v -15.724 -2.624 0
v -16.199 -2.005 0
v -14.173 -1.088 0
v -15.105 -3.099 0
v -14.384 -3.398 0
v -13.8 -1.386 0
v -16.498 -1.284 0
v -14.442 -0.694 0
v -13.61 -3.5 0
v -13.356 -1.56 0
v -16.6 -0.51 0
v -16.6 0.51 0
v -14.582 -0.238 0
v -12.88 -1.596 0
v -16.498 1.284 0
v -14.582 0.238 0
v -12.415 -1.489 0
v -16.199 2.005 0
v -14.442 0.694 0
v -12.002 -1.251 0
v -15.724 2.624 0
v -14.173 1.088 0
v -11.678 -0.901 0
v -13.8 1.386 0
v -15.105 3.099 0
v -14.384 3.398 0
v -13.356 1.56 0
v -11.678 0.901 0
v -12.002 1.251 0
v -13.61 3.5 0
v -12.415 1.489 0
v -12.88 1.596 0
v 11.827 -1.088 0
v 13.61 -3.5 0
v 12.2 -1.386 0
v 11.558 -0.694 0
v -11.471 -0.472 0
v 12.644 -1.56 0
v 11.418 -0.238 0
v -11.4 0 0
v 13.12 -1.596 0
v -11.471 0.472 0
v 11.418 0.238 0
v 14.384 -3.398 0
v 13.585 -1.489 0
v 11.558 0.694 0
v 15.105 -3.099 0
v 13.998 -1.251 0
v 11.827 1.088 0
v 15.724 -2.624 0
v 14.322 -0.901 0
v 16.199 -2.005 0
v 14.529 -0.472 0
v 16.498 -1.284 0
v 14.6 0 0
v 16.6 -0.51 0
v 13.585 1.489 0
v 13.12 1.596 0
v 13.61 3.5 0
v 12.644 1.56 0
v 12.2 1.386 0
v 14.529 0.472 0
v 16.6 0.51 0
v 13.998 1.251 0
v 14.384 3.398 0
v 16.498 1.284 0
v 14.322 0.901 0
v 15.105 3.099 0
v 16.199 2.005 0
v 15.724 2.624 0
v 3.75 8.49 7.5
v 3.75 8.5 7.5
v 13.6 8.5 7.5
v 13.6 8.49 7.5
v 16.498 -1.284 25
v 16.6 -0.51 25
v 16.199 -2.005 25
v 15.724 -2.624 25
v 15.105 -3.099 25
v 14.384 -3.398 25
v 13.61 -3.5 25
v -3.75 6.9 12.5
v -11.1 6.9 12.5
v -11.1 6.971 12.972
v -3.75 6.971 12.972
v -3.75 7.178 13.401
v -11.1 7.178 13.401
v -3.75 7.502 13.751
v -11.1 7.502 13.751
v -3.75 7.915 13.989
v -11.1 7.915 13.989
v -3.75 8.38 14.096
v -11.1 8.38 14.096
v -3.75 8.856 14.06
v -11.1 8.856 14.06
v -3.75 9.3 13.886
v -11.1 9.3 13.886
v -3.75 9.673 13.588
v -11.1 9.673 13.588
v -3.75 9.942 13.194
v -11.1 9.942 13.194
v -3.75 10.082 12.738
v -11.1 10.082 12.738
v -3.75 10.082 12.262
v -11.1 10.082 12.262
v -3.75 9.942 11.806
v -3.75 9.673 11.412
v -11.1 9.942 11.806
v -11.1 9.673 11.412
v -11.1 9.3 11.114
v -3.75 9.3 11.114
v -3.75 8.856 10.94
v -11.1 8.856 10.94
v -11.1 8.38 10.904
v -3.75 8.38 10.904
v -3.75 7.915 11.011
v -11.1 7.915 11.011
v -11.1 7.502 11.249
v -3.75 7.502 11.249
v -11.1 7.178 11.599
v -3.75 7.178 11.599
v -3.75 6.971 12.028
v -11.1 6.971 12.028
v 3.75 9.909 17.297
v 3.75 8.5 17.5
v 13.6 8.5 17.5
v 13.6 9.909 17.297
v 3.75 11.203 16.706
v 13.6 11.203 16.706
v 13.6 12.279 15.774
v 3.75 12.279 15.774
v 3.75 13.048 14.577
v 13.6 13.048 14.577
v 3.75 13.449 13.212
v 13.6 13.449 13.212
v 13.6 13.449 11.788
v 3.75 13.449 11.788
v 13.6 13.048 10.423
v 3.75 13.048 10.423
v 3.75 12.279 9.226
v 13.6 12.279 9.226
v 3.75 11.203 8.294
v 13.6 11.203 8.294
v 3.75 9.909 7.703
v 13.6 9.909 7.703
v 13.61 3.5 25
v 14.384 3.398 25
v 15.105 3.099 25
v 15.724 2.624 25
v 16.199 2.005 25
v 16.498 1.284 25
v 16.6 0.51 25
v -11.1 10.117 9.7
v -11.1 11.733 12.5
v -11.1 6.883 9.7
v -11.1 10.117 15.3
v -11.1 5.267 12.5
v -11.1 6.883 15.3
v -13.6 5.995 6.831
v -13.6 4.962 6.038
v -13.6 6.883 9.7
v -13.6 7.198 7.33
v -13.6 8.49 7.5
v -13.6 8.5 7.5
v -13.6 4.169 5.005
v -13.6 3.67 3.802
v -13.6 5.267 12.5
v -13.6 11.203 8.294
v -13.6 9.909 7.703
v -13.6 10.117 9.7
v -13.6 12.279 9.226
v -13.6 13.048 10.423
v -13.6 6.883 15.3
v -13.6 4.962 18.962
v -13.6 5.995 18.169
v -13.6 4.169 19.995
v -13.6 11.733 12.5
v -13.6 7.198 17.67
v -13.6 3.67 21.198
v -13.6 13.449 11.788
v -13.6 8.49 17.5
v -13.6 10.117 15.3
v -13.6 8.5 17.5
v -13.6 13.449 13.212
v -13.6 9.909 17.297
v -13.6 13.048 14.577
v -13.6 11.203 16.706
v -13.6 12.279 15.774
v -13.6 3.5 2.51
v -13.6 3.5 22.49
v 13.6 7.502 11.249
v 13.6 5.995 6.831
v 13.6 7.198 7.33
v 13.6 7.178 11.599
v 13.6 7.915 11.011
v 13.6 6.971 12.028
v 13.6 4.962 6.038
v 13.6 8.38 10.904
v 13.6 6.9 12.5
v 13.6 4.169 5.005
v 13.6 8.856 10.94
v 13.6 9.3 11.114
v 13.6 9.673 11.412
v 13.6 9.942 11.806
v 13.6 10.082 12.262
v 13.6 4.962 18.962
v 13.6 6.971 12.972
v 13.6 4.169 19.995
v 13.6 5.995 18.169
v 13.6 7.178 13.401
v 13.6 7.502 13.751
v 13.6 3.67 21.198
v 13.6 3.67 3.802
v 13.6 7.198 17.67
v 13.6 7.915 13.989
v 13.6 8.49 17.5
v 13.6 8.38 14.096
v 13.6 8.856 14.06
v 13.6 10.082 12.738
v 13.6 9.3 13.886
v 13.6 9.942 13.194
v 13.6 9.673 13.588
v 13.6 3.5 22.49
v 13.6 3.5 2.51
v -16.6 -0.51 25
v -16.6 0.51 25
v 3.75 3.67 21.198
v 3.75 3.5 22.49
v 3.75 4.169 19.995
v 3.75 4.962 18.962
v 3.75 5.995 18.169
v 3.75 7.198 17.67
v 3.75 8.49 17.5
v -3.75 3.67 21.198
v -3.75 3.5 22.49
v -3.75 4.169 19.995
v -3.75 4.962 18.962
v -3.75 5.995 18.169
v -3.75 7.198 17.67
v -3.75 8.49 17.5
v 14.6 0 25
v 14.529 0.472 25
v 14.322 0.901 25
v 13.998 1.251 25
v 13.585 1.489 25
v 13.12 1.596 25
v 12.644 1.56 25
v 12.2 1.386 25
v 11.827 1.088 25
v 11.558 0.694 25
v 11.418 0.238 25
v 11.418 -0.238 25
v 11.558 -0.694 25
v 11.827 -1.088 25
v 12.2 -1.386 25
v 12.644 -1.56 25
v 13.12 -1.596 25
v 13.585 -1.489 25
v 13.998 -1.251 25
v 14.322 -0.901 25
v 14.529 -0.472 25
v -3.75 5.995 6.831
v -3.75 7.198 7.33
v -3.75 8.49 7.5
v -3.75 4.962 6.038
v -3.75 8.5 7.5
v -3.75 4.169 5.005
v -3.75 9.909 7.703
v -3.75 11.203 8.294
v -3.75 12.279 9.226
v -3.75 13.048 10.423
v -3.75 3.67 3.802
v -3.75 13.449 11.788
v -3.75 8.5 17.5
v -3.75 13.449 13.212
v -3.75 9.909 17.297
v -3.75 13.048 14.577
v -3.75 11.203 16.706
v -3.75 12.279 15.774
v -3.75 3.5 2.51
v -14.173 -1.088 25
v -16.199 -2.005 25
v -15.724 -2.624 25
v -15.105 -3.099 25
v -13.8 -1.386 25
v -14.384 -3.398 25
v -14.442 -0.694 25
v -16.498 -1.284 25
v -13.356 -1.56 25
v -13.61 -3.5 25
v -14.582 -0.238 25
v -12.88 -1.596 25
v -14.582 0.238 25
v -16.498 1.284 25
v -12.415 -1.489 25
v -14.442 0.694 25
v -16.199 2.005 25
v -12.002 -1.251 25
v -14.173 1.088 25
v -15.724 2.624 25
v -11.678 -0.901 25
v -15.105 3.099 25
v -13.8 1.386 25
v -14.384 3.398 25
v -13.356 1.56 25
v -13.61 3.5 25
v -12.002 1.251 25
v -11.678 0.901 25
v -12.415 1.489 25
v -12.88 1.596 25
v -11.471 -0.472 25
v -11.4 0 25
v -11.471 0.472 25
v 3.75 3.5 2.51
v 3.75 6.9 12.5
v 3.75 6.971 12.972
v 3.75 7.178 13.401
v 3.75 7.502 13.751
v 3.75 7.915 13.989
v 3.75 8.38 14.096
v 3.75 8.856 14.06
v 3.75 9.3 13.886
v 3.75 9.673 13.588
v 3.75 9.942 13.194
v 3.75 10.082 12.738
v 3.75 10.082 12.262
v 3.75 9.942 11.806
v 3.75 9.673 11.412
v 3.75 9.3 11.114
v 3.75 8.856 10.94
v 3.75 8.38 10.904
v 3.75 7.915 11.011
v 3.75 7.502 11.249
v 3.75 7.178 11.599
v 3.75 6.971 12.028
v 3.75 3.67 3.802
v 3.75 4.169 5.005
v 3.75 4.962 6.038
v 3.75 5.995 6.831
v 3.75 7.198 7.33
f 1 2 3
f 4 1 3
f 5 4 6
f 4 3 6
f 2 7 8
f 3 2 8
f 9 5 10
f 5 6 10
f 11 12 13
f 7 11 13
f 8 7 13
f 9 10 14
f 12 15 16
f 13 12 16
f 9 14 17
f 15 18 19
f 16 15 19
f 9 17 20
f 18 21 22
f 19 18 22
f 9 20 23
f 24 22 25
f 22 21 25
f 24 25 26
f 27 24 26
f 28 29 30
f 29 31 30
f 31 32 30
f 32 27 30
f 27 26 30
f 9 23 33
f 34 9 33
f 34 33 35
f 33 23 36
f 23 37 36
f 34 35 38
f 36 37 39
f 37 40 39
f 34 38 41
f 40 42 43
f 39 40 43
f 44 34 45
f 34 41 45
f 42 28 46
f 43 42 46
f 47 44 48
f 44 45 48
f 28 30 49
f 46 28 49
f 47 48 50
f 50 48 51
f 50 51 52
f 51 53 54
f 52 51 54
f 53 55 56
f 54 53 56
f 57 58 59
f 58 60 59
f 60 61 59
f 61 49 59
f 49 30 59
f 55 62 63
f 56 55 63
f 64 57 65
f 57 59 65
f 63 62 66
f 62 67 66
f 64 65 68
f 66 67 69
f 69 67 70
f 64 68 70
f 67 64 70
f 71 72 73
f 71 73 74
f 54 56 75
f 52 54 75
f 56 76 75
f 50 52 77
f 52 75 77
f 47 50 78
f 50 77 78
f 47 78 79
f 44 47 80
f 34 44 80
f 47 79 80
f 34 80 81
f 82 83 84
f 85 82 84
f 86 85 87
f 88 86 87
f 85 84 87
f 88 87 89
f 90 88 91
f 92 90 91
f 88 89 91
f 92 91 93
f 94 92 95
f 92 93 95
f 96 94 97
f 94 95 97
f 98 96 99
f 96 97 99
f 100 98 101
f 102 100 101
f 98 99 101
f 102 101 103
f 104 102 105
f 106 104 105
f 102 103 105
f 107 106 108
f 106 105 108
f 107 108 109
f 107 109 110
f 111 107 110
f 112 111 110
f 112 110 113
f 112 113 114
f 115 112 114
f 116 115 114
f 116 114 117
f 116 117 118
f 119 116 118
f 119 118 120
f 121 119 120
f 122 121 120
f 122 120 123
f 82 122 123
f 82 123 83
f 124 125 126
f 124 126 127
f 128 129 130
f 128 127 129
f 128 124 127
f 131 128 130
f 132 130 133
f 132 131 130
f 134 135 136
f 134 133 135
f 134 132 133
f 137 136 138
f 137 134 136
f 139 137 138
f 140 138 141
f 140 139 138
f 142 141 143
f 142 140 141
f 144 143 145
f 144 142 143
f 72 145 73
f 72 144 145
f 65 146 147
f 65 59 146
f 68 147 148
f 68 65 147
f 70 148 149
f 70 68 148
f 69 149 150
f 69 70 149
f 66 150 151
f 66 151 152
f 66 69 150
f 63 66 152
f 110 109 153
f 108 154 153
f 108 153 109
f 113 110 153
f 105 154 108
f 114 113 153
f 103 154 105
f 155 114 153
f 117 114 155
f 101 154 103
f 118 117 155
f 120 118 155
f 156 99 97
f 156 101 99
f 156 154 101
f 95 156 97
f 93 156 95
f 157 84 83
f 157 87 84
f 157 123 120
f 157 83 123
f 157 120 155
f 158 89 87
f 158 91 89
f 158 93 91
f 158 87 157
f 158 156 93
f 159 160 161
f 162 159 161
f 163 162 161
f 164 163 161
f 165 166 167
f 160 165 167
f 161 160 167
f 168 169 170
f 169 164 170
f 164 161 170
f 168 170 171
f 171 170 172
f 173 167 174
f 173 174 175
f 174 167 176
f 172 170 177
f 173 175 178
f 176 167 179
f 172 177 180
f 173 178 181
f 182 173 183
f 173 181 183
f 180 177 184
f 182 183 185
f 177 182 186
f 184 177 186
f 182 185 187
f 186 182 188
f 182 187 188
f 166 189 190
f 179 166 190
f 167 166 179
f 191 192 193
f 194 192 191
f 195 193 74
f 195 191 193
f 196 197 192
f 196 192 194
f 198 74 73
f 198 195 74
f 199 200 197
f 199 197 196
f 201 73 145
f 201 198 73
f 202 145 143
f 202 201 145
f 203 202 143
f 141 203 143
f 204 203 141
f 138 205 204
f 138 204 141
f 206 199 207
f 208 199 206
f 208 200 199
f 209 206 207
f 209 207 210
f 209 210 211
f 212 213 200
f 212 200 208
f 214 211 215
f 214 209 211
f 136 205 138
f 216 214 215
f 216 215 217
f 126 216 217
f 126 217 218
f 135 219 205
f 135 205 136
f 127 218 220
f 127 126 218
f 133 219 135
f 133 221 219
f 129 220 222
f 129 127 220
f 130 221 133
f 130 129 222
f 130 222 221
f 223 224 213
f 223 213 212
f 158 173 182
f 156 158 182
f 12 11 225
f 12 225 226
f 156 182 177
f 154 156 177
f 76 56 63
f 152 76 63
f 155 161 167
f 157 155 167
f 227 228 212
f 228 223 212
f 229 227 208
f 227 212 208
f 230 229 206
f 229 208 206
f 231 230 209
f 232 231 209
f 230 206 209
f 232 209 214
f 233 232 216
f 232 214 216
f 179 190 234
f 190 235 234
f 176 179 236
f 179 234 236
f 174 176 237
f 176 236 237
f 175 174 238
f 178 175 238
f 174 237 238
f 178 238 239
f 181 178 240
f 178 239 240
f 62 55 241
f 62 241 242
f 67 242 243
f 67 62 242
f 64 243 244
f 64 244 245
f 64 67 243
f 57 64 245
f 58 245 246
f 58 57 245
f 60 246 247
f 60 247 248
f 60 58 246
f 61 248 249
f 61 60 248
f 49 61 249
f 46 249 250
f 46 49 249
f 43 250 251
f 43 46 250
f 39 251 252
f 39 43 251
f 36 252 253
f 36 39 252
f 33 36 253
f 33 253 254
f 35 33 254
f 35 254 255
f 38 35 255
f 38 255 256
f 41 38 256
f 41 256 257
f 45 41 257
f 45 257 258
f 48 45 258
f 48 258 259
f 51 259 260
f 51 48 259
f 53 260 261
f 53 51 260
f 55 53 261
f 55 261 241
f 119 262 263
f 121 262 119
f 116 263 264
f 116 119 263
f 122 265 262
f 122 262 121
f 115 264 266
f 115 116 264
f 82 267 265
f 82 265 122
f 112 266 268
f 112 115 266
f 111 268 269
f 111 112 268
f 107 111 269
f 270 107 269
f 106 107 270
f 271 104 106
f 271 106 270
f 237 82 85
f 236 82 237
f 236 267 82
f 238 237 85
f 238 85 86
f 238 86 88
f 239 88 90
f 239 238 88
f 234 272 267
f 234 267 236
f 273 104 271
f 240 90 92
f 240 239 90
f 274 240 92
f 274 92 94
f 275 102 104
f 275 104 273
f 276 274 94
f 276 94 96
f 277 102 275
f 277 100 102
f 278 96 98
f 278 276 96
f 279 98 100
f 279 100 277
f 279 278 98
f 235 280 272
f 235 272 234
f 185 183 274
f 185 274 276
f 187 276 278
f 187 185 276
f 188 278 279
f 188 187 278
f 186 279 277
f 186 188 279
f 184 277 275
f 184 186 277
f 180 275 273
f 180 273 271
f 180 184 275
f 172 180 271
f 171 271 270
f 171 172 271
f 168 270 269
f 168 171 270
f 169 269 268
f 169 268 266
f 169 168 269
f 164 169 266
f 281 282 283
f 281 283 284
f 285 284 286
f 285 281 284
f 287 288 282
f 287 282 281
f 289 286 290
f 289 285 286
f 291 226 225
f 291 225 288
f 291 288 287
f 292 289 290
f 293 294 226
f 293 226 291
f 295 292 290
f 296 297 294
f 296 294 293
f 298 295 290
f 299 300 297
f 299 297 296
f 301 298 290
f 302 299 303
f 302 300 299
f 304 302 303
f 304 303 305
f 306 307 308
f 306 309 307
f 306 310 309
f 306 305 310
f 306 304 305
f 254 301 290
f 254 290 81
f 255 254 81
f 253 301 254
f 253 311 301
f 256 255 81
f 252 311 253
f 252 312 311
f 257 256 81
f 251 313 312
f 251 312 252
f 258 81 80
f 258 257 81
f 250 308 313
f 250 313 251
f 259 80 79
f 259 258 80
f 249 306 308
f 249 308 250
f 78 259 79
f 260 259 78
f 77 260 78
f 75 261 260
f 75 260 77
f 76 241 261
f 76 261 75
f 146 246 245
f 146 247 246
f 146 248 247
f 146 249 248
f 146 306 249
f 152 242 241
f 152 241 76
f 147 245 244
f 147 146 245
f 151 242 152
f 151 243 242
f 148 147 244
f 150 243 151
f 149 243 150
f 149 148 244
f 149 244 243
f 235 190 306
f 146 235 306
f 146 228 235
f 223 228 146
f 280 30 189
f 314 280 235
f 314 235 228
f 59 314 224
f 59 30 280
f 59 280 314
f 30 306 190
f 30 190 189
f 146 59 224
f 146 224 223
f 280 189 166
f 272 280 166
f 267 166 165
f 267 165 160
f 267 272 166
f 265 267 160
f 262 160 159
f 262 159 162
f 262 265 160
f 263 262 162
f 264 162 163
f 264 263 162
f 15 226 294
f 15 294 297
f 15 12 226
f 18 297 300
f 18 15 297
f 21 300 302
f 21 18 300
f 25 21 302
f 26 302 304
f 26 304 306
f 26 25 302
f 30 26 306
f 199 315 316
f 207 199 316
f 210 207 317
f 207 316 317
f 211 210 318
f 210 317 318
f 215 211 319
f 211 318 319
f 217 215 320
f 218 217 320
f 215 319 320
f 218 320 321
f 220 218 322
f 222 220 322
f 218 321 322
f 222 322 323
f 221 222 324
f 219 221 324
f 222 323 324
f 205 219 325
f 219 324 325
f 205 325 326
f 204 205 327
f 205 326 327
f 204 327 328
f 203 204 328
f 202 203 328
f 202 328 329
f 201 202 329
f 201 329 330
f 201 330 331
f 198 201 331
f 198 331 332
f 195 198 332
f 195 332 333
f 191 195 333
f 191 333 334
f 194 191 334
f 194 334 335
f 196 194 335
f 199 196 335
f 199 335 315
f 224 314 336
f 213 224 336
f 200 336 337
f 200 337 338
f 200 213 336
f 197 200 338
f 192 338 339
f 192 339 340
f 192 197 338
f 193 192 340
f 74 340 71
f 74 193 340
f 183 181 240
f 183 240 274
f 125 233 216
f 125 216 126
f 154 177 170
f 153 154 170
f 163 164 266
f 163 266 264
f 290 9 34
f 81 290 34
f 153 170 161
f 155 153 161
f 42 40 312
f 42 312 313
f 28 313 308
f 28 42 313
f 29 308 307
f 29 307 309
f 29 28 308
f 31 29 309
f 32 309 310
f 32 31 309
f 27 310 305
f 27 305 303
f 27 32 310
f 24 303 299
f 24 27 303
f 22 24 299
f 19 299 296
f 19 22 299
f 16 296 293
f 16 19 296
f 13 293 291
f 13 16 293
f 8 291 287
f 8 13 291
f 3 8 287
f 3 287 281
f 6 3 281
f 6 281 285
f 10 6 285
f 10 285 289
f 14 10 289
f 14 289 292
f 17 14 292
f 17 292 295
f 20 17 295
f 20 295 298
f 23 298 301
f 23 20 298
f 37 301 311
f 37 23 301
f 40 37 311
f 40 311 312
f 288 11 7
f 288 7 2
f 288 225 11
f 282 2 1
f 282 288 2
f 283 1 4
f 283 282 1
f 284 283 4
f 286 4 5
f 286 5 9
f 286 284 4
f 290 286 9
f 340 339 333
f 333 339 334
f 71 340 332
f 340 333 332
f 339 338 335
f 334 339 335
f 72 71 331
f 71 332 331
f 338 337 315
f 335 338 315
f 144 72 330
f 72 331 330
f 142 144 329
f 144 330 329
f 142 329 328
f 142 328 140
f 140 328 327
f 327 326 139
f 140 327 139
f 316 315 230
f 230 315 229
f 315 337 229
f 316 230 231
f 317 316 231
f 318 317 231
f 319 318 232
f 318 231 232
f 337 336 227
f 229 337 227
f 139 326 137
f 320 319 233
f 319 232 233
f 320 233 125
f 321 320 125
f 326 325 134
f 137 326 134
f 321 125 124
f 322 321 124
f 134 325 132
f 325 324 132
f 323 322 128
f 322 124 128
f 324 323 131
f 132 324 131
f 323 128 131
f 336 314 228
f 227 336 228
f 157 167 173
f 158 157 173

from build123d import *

# Parameters (mm, degrees)
SKETCH_W        = 33.2
SKETCH_H        = 7
SKETCH_R        = 1.6
PAD_DEPTH       = 25
SKETCH001_R     = 1.6
PAD001_DEPTH    = 33.2
SKETCH002_W     = 7.5
SKETCH002_H     = 10
SKETCH002_W_2   = 3
POCKET_DEPTH    = 25.001
FILLET_R        = 2.99
FILLET001_R     = 4.99
POCKET001_DEPTH = 2.5


with BuildPart() as part:
    # Sketch → Pad (new body)
    with BuildSketch(Plane.XY):
        Rectangle(SKETCH_W, SKETCH_H)
        with Locations((-13, 0)):
            Circle(SKETCH_R, mode=Mode.SUBTRACT)
        with Locations((13, 0)):
            Circle(SKETCH_R, mode=Mode.SUBTRACT)
    extrude(amount=PAD_DEPTH)

    # Sketch001 (on Face4 of Pad) → Pad001 (join)
    with BuildSketch(Plane(origin=(-16.6, 0, 0), x_dir=(0, -1, 0), z_dir=(-1, 0, 0))):
        with BuildLine():
            Line((-3.5, 17.5), (-3.5, 7.5))
            Line((-8.5, 7.5), (-3.5, 7.5))
            ThreePointArc((-8.5, 17.5), (-13.5, 12.5), (-8.5, 7.5))
            Line((-3.5, 17.5), (-8.5, 17.5))
        make_face()
        with Locations((-8.5, 12.5)):
            Circle(SKETCH001_R, mode=Mode.SUBTRACT)
    extrude(amount=-PAD001_DEPTH)

    # Sketch002 (on Face11 of Pad001) → Pocket (cut, through all)
    with BuildSketch(Plane.XY.offset(25)):
        with Locations((0, 8.5)):
            Rectangle(SKETCH002_W, SKETCH002_H)
        with Locations((-15.1, 8.5)):
            Rectangle(SKETCH002_W_2, SKETCH002_H)
        with Locations((15.1, 8.5)):
            Rectangle(SKETCH002_W_2, SKETCH002_H)
    extrude(amount=-POCKET_DEPTH, mode=Mode.SUBTRACT)

    # Fillet
    fillet_edges = [part.edges().sort_by_distance(p)[0] for p in [
        (-16.6, 3.5, 12.5),
        (-16.6, -3.5, 12.5),
        (16.6, -3.5, 12.5),
        (16.6, 3.5, 12.5),
    ]]
    fillet(fillet_edges, radius=FILLET_R)

    # Fillet001
    fillet001_edges = [part.edges().sort_by_distance(p)[0] for p in [
        (8.675, 3.5, 17.5),
        (-8.675, 3.5, 17.5),
        (8.675, 3.5, 7.5),
        (-8.675, 3.5, 7.5),
    ]]
    fillet(fillet001_edges, radius=FILLET001_R)

    # Sketch003 (on Face2 of Fillet001) → Pocket001 (cut)
    with BuildSketch(Plane(origin=(-13.6, 0, 0), x_dir=(0, -1, 0), z_dir=(-1, 0, 0))):
        Polygon((-5.266838, 12.5), (-6.883419, 15.3), (-10.116581, 15.3), (-11.733162, 12.5), (-10.116581, 9.7), (-6.883419, 9.7), align=None)
    extrude(amount=-POCKET001_DEPTH, mode=Mode.SUBTRACT)


solid = part.part
